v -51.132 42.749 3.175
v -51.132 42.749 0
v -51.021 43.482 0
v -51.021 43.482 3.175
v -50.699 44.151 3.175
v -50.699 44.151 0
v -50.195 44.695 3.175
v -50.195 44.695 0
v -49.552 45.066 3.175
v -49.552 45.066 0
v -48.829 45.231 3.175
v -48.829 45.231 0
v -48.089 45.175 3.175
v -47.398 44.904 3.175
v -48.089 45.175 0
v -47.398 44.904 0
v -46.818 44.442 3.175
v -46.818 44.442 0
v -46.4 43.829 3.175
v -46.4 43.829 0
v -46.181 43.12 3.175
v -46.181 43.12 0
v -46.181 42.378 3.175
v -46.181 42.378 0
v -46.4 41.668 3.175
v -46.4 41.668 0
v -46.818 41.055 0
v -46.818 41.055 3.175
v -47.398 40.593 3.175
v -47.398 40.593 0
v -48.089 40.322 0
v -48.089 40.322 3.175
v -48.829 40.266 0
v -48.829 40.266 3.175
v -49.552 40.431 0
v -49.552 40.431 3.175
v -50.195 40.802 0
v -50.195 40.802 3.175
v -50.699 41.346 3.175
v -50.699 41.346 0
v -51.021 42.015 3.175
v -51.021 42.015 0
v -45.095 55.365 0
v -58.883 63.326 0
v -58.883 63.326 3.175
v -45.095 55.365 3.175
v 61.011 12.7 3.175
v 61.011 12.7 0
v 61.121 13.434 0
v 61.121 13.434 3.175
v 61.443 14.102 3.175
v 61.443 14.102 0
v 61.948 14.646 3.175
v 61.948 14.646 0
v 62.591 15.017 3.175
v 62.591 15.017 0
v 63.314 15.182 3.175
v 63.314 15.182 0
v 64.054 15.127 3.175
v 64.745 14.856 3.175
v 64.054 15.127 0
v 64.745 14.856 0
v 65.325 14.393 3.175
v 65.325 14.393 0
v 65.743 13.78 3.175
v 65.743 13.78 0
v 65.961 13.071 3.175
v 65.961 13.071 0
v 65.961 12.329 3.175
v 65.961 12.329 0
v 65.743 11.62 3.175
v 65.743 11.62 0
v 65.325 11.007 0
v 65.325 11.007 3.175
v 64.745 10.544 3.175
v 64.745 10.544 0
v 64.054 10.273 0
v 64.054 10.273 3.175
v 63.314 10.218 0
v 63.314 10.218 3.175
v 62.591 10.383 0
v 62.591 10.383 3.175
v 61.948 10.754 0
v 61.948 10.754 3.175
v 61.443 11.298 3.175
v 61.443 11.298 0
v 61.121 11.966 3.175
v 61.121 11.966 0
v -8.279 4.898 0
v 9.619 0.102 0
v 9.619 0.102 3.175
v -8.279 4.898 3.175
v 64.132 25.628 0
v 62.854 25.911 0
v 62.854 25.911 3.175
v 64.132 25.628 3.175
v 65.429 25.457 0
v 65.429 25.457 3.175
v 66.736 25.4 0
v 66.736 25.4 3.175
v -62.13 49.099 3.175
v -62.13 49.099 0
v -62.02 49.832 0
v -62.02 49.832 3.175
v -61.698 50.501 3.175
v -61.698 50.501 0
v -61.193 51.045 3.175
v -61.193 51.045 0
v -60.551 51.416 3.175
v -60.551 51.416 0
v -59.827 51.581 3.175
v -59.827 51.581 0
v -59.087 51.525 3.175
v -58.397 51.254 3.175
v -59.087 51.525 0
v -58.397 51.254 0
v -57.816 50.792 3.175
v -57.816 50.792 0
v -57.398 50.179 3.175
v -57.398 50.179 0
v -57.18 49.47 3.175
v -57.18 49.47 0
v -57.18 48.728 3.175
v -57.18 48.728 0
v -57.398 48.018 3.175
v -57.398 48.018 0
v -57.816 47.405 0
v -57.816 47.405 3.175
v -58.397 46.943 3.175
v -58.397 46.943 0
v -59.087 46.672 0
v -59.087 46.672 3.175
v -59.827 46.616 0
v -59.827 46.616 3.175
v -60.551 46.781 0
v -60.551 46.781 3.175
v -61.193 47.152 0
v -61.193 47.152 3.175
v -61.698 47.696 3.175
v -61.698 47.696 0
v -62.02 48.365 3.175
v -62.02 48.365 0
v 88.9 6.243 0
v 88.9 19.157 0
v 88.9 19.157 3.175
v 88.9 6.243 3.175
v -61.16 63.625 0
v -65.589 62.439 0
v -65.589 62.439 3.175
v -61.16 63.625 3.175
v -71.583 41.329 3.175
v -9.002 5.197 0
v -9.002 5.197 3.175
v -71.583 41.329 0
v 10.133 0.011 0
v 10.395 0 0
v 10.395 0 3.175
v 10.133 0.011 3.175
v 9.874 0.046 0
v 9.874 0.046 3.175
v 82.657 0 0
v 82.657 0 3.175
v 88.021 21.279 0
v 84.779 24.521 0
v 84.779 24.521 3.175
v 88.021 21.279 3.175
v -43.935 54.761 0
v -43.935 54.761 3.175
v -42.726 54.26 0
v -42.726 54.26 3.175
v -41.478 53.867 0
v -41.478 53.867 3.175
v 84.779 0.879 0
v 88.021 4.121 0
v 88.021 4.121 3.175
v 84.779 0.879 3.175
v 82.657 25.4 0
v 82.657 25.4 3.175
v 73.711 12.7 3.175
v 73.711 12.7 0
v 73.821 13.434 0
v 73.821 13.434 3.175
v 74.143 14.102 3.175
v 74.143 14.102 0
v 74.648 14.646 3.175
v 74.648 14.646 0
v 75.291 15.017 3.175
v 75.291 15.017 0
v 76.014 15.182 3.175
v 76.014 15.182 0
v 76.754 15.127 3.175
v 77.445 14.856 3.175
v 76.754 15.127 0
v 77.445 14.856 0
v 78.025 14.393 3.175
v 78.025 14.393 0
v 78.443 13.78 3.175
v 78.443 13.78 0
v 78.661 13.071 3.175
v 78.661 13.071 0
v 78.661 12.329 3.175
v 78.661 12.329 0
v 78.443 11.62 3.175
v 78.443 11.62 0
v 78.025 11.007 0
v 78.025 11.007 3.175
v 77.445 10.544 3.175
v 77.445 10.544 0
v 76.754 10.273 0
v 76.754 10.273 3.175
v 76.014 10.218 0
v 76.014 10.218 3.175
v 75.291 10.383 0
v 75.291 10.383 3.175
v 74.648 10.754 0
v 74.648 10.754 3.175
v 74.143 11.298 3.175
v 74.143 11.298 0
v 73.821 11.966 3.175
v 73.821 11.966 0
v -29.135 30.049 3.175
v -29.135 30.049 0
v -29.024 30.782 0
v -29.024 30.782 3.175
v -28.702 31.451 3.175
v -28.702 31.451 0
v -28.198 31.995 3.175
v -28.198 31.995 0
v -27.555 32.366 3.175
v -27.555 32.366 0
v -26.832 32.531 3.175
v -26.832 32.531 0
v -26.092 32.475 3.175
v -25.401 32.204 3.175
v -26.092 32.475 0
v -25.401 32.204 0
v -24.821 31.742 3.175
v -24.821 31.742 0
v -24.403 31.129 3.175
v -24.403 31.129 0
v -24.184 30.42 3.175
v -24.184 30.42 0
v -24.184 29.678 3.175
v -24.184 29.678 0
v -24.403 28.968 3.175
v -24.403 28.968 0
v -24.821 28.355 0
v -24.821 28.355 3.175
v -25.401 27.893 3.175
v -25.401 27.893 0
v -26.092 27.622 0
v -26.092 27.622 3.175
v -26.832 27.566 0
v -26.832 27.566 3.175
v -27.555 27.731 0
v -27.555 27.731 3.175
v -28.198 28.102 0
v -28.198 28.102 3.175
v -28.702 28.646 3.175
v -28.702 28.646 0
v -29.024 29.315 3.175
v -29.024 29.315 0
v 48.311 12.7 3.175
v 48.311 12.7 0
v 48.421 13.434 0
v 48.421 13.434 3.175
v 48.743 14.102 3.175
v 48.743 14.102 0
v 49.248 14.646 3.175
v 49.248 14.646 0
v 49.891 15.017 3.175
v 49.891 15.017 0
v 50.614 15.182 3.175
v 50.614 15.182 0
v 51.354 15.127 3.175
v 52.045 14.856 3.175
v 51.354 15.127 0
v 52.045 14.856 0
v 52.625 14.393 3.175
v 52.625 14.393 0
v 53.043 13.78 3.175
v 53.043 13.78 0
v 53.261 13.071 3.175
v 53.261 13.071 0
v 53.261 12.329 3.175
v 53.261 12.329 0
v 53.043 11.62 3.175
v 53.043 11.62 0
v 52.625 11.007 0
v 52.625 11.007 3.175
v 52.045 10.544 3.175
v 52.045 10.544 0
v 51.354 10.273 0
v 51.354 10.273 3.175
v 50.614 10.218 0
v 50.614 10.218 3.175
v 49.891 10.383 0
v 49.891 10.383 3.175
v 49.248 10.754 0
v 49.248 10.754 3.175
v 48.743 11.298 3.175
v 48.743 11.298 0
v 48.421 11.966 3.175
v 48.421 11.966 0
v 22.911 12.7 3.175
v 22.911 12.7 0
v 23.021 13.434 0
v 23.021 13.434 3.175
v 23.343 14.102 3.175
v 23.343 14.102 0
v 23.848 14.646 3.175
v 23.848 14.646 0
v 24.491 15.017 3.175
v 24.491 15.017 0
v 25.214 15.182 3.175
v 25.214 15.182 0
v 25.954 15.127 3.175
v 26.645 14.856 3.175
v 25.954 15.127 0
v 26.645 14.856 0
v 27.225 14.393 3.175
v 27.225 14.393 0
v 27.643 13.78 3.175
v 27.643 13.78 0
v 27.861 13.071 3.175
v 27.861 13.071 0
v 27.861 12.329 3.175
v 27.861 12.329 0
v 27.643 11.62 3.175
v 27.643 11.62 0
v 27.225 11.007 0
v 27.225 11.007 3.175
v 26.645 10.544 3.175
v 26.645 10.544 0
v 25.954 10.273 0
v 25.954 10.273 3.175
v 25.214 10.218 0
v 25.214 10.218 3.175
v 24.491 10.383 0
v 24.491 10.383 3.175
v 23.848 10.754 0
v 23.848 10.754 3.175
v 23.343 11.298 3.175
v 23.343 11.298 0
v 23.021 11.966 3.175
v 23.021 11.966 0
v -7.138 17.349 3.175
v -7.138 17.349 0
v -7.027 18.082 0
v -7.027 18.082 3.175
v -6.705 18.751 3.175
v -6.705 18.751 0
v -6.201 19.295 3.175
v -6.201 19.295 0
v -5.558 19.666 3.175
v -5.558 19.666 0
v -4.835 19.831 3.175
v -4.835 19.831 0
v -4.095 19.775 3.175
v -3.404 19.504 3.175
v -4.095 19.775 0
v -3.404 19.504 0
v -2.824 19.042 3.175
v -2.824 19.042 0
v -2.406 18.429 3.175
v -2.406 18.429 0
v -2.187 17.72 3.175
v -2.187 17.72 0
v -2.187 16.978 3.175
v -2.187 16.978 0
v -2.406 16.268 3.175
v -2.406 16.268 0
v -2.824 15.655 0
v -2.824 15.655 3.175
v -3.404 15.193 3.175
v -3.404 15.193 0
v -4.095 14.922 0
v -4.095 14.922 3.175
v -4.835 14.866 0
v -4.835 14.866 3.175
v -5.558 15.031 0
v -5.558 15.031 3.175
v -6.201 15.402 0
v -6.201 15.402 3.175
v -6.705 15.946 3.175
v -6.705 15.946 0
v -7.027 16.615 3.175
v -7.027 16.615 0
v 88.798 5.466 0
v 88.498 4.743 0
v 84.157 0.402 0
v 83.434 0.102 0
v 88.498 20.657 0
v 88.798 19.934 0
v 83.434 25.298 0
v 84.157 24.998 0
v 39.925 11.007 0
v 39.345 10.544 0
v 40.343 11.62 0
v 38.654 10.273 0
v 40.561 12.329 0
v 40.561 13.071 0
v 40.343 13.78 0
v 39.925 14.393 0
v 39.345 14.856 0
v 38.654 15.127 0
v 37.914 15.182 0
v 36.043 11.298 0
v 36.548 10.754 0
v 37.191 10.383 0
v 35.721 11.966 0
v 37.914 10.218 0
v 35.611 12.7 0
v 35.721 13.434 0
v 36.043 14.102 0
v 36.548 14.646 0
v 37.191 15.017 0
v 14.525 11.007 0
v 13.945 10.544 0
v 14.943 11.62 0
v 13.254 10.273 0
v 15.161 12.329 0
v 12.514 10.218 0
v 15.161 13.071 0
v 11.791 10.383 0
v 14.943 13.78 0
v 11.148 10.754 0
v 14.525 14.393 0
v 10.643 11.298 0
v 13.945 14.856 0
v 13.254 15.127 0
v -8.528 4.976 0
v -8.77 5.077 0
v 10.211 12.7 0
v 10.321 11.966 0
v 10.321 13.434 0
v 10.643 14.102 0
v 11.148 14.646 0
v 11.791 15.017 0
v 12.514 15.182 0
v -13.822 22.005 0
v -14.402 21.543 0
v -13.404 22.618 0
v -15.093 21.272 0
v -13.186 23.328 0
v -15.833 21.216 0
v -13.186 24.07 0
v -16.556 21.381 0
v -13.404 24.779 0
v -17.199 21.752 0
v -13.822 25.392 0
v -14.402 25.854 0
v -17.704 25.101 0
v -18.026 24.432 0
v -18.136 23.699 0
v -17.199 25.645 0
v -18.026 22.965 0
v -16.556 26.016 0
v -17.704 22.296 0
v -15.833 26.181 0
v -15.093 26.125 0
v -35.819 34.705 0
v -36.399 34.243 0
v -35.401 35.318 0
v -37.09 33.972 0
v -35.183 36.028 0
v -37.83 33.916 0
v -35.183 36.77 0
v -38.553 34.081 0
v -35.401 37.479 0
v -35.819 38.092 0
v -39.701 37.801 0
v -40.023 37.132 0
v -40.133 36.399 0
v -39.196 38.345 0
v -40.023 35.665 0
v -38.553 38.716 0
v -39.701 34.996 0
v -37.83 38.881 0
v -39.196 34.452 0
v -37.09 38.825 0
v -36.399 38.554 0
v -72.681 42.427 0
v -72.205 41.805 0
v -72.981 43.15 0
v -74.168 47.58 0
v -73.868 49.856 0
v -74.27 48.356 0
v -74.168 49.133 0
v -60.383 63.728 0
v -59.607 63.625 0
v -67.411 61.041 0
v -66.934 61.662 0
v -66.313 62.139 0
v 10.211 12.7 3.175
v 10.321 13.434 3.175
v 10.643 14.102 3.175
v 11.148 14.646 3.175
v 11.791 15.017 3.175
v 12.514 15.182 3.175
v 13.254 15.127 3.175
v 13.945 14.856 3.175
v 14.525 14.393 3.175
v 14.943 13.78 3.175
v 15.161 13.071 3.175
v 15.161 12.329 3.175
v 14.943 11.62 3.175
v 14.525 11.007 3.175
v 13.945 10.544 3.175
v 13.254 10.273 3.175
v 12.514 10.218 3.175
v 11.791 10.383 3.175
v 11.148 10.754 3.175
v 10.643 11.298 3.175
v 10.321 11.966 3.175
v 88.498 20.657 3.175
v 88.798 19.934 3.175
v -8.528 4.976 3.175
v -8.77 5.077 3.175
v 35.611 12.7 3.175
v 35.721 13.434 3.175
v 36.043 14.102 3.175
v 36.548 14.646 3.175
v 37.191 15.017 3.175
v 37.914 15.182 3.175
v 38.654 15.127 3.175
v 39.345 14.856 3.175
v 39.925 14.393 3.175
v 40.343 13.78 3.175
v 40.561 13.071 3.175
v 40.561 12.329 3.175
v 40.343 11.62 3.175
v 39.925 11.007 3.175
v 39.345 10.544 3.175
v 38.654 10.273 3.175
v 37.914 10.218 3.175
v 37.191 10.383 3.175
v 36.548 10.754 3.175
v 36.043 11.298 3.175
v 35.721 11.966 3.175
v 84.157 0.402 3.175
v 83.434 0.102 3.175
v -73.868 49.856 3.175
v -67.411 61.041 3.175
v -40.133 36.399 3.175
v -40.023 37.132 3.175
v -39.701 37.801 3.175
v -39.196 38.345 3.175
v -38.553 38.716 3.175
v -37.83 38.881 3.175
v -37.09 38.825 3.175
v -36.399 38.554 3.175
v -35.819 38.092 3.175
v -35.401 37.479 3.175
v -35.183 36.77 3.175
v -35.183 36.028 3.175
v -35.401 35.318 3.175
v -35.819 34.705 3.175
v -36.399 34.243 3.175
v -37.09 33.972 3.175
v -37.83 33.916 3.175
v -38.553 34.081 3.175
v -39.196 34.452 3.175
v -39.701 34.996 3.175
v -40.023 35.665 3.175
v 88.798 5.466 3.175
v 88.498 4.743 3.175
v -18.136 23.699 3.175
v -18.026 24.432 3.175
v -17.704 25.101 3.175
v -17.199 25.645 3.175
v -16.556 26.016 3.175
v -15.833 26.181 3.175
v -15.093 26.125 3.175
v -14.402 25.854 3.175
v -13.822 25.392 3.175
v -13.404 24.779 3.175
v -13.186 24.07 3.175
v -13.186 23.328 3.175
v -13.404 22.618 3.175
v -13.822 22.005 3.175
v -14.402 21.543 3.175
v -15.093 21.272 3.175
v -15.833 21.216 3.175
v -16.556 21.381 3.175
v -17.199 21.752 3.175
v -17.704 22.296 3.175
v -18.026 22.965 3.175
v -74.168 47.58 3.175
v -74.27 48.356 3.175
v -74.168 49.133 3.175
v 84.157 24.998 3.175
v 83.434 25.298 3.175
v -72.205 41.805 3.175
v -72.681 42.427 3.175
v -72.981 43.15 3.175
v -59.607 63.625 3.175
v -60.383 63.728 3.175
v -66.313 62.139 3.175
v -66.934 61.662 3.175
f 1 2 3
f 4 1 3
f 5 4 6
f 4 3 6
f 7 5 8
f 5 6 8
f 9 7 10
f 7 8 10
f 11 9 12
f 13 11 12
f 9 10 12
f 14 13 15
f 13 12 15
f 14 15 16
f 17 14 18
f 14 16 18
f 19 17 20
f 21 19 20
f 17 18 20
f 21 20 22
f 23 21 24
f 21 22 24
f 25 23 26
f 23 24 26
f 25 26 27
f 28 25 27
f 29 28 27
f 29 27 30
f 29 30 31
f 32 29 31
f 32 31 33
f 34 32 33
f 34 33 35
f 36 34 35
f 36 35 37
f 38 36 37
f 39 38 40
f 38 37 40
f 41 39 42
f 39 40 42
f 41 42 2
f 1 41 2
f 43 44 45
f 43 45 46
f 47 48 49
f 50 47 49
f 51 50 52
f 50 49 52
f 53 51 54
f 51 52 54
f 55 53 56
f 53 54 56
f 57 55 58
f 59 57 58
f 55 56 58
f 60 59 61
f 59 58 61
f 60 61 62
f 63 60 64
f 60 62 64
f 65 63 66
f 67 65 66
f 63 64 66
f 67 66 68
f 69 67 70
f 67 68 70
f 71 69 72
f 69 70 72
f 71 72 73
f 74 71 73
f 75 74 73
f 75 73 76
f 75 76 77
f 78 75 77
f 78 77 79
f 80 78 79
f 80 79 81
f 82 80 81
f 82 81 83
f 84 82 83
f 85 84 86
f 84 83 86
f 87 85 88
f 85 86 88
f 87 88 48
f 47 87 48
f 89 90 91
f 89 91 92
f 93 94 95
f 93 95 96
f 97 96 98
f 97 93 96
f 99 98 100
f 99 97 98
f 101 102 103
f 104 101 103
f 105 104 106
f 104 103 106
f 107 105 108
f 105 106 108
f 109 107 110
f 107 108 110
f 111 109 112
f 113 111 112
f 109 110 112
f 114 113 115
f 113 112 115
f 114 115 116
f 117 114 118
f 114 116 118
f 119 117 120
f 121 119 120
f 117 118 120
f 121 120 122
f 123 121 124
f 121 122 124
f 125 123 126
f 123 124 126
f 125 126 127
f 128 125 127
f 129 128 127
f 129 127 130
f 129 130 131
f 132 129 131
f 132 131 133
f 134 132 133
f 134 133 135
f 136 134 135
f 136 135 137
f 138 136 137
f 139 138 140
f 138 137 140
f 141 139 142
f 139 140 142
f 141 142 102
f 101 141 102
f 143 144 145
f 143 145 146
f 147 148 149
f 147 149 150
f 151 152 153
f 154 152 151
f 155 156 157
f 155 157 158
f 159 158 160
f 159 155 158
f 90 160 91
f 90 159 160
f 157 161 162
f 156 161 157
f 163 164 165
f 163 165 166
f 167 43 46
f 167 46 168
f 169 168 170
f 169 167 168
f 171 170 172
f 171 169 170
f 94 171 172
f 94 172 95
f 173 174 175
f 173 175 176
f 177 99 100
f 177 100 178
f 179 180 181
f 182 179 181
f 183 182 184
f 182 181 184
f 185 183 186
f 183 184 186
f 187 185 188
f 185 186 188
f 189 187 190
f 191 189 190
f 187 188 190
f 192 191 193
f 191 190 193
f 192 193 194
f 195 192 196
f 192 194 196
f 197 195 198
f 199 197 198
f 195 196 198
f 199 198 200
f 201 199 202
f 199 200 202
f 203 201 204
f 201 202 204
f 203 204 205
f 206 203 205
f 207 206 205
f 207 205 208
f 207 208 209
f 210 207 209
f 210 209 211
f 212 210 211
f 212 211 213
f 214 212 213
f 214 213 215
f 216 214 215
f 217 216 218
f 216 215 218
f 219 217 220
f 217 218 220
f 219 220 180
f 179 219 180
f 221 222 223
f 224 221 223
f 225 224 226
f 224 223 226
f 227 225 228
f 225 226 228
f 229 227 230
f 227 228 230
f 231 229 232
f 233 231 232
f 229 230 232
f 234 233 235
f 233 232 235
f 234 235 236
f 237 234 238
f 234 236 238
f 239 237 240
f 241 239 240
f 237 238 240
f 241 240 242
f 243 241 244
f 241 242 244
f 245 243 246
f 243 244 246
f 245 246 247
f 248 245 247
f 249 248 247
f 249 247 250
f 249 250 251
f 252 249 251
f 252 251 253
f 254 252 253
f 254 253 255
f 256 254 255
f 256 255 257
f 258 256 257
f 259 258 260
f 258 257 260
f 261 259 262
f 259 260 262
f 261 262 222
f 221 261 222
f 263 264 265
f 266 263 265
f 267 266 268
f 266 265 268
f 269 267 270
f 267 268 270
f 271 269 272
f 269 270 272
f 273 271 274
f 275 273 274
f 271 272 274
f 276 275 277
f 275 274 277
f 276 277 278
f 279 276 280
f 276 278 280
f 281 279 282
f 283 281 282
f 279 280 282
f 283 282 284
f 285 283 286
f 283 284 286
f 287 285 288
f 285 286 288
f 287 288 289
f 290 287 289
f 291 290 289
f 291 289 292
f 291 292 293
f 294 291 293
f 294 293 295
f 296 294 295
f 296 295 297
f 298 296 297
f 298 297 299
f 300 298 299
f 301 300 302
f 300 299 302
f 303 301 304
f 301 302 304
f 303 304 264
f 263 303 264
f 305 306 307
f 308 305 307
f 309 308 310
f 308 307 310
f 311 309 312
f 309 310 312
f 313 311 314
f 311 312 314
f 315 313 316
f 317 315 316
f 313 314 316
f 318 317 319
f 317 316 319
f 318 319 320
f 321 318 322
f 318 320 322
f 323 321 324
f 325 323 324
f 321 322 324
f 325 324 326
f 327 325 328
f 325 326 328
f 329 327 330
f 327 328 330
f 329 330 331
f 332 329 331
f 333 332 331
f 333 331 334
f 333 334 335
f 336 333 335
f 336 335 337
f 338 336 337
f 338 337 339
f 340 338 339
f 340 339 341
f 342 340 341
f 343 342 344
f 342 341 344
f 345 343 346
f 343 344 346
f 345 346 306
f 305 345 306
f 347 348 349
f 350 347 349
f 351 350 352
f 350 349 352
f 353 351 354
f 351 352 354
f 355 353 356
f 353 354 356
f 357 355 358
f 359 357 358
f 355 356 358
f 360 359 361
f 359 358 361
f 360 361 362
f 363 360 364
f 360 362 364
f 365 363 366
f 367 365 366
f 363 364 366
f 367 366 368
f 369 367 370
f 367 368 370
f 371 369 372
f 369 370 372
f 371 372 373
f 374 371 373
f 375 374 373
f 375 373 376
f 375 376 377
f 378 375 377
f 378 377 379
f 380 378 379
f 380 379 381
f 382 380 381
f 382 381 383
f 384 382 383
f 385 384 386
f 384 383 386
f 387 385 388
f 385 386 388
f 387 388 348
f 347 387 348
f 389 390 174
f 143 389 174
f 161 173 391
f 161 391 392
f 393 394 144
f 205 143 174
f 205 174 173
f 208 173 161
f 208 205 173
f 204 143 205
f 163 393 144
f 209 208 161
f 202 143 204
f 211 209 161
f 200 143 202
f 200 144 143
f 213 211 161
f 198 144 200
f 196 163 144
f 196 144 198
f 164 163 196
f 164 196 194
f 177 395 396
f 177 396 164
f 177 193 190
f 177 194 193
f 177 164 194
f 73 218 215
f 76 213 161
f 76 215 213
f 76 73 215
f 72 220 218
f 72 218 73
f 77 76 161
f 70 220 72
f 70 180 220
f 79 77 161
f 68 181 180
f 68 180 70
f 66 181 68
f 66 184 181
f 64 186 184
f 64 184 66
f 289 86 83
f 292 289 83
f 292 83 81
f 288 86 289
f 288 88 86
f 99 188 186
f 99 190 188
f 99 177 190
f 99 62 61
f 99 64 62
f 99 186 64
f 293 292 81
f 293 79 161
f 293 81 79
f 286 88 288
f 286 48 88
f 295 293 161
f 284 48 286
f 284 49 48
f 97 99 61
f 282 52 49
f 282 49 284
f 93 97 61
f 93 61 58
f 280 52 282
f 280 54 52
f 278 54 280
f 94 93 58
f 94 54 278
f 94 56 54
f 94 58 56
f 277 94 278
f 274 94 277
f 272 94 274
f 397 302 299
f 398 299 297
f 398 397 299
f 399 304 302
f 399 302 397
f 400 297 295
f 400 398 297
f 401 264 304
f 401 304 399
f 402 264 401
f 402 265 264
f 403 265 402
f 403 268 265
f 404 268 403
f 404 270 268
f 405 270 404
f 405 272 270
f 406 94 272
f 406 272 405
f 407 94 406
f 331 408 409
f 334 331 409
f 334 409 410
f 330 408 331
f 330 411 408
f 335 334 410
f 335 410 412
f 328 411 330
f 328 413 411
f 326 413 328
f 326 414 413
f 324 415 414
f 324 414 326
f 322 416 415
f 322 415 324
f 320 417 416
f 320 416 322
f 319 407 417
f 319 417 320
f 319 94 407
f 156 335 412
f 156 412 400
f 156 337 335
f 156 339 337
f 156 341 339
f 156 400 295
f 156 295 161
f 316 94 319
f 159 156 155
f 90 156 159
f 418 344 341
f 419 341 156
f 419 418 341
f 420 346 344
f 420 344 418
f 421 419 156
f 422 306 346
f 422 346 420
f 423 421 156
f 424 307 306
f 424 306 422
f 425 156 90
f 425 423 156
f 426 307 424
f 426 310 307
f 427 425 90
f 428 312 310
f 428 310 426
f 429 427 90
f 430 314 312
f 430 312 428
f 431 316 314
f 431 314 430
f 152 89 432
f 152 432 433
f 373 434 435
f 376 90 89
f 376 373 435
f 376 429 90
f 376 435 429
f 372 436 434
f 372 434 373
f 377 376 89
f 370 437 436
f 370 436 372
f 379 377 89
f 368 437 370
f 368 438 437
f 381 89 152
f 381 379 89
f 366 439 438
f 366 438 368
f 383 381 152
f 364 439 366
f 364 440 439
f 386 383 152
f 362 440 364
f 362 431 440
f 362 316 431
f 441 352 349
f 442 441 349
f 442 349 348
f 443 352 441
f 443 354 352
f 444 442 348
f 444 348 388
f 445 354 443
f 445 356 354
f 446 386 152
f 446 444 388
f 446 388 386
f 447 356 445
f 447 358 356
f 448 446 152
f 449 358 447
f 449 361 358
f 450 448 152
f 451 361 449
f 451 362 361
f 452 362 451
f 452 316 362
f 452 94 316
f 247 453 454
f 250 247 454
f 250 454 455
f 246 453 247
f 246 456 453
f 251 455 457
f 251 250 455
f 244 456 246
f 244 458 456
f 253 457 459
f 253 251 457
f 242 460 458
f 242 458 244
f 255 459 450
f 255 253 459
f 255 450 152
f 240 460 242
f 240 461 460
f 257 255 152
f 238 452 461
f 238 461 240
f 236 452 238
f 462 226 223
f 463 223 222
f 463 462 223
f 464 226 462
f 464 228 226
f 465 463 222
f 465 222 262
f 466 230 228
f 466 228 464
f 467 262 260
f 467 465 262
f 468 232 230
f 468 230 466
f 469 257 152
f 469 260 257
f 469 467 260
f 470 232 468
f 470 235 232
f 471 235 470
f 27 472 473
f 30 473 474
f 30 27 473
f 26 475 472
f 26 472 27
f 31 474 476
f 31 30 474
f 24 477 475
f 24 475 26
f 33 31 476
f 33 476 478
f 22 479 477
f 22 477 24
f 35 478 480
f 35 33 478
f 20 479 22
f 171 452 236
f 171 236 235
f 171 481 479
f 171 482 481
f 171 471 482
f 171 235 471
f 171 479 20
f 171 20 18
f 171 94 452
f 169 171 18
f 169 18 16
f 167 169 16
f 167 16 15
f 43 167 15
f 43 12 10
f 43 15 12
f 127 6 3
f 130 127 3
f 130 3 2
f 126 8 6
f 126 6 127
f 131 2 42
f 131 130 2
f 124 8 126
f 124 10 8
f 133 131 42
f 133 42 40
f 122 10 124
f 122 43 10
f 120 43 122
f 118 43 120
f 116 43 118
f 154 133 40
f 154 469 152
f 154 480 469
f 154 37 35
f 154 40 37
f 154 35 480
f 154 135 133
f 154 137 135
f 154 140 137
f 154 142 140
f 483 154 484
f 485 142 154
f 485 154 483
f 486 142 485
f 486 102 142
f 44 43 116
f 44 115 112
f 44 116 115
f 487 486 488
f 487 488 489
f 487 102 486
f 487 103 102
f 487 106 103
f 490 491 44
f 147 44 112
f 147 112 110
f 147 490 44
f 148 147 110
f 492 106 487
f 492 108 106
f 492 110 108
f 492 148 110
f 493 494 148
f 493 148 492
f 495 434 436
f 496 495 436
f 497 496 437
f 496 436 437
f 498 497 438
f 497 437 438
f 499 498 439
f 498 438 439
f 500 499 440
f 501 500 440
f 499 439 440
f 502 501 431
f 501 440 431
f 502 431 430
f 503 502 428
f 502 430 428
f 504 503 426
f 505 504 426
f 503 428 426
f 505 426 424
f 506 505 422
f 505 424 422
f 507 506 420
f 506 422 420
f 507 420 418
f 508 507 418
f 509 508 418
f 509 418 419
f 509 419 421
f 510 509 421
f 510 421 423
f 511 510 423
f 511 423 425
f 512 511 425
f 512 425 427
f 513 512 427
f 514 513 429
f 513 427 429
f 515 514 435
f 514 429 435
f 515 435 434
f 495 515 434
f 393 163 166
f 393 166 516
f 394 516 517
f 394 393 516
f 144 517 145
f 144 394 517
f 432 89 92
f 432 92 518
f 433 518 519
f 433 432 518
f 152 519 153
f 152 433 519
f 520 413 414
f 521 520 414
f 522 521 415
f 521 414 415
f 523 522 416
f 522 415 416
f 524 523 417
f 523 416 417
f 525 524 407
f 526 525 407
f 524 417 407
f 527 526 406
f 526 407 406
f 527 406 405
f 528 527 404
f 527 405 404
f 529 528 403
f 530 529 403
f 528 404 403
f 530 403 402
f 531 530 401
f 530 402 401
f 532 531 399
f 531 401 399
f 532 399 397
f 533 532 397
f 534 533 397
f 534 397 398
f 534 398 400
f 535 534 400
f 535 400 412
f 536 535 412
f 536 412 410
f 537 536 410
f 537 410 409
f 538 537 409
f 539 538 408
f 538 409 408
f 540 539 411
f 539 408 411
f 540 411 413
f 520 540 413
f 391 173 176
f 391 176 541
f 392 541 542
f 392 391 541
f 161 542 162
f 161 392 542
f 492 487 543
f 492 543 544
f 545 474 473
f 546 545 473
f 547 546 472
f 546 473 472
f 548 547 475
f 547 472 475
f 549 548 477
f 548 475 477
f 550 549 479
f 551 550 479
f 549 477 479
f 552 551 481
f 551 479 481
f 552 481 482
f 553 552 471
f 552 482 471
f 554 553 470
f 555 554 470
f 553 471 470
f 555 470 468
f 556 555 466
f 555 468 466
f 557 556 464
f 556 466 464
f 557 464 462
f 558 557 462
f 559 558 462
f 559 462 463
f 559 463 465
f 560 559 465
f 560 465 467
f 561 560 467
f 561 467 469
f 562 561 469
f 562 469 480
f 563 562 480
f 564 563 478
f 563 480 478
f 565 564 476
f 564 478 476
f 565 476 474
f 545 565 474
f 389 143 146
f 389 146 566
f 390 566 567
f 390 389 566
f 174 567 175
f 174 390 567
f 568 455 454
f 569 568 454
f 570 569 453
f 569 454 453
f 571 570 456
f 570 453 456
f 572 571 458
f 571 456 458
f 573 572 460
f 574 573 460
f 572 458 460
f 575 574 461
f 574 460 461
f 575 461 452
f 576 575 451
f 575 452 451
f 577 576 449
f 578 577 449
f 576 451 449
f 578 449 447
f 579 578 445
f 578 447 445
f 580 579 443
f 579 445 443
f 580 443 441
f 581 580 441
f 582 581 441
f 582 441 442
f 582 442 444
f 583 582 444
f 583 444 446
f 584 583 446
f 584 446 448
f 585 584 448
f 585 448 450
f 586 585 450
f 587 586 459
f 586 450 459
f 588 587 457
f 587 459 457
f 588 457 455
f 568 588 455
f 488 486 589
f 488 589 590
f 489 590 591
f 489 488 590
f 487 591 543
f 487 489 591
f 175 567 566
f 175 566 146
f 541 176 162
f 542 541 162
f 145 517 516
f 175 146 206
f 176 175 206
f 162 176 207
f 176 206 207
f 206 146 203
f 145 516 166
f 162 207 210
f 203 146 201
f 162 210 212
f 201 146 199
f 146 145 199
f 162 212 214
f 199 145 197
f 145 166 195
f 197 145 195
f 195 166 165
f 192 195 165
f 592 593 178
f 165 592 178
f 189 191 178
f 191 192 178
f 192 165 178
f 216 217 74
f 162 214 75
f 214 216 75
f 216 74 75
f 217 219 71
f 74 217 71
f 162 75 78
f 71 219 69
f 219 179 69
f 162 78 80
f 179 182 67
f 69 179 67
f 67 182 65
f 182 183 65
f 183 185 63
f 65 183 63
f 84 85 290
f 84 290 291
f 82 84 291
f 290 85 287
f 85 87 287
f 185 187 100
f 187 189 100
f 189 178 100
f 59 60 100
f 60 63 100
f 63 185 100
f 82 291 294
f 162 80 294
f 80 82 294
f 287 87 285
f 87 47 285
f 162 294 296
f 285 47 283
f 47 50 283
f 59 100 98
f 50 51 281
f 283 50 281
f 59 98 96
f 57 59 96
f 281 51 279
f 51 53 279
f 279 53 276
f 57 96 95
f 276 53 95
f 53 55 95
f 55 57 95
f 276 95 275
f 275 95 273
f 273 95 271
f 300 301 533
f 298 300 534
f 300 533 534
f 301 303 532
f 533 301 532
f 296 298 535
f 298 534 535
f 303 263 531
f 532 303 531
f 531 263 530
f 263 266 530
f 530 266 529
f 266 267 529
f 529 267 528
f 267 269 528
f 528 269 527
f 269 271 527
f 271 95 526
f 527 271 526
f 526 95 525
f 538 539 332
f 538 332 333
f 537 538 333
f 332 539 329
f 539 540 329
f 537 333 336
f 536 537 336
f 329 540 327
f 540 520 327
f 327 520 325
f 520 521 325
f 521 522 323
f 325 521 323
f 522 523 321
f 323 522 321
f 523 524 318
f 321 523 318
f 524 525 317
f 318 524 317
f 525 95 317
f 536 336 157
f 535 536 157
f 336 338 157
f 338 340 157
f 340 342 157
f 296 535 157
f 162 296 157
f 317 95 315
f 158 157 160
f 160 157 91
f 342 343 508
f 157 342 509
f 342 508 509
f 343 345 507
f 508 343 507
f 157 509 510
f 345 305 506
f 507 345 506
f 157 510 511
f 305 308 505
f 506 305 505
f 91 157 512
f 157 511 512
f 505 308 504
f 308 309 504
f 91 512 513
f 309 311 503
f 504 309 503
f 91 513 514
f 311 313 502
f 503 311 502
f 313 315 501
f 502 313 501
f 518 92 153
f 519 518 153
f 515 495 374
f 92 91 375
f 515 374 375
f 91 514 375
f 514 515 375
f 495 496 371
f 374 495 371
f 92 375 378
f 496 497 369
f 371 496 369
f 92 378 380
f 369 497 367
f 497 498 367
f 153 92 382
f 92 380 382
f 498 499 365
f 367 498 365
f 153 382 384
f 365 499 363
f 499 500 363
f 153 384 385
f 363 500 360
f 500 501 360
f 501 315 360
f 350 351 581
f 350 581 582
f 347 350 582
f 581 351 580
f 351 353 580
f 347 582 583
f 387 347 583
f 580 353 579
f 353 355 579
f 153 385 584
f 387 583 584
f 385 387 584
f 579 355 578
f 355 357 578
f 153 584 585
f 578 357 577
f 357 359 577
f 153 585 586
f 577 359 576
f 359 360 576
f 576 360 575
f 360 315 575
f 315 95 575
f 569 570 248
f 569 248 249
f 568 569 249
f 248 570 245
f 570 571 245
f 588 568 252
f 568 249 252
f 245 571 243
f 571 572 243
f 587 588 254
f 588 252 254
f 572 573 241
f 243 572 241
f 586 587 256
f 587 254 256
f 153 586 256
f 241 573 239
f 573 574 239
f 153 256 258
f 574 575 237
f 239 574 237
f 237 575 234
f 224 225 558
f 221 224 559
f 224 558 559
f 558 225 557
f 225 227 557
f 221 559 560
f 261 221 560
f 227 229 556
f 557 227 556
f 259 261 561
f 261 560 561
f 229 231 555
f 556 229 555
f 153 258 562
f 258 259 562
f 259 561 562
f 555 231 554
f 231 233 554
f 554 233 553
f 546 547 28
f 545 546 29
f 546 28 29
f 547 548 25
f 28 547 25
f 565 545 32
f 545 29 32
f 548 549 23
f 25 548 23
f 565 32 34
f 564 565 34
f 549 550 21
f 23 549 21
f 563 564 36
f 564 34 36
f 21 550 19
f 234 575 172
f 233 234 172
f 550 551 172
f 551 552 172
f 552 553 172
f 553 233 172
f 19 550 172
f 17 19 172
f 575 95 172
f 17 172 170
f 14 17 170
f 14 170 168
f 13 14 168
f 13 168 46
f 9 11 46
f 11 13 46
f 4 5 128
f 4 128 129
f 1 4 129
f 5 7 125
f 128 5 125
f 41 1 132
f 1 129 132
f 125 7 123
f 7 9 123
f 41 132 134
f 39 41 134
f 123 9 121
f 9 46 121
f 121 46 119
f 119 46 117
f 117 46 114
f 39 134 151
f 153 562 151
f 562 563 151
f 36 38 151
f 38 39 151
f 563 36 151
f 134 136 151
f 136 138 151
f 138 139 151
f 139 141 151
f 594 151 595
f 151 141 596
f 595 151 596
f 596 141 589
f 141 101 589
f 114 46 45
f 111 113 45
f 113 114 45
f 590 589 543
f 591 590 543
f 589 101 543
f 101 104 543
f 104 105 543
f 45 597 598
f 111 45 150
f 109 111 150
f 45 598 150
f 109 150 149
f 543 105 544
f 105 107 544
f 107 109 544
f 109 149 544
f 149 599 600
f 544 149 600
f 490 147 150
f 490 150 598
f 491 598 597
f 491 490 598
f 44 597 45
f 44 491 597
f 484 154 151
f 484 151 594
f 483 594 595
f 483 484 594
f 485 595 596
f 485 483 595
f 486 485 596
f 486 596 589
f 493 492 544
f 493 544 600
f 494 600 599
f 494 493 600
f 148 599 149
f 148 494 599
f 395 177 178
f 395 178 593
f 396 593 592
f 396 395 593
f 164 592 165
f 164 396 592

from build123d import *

# Parameters (mm, degrees)
SKETCH1_R           = 2.4892
BOSS_EXTRUDE1_DEPTH = 3.175


with BuildPart() as part:
    # Sketch1 → Boss-Extrude1 (new body)
    with BuildSketch(Plane(origin=(0, 0, 0), x_dir=(-1, 0, 0), z_dir=(0, 0, -1))):
        with BuildLine():
            Line((-82.657359313, 0), (-10.394957493, 0))
            ThreePointArc((-10.394957493, 0), (-10.003378916, 0.025665416), (-9.618500357, 0.102222521))
            Line((-9.618500357, 0.102222521), (8.278754395, 4.897777479))
            ThreePointArc((8.278754395, 4.897777479), (8.650347557, 5.02391636), (9.00229726, 5.197478746))
            Line((9.00229726, 5.197478746), (71.583372975, 41.328679656))
            ThreePointArc((71.583372975, 41.328679656), (72.463432996, 42.100471581), (72.981150454, 43.150298732))
            Line((72.981150454, 43.150298732), (74.16803932, 47.579828286))
            ThreePointArc((74.16803932, 47.579828286), (74.244596426, 48.747863998), (73.868338053, 49.856285422))
            Line((73.868338053, 49.856285422), (67.41097874, 61.040759834))
            ThreePointArc((67.41097874, 61.040759834), (66.639186816, 61.920819855), (65.589359664, 62.438537313))
            Line((65.589359664, 62.438537313), (61.15983011, 63.62542618))
            ThreePointArc((61.15983011, 63.62542618), (59.991794398, 63.701983285), (58.883372975, 63.325724913))
            Line((58.883372975, 63.325724913), (45.095284847, 55.365168521))
            ThreePointArc((45.095284847, 55.365168521), (43.335536333, 54.49735659), (41.477570524, 53.866662183))
            Line((41.477570524, 53.866662183), (-62.853960852, 25.911112606))
            ThreePointArc((-62.853960852, 25.911112606), (-64.778353646, 25.528327079), (-66.736246529, 25.4))
            Line((-66.736246529, 25.4), (-82.657359313, 25.4))
            ThreePointArc((-82.657359313, 25.4), (-83.80540961, 25.171638598), (-84.778679656, 24.521320344))
            Line((-84.778679656, 24.521320344), (-88.021320344, 21.278679656))
            ThreePointArc((-88.021320344, 21.278679656), (-88.671638598, 20.30540961), (-88.9, 19.157359313))
            Line((-88.9, 19.157359313), (-88.9, 6.242640687))
            ThreePointArc((-88.9, 6.242640687), (-88.671638598, 5.09459039), (-88.021320344, 4.121320344))
            Line((-88.021320344, 4.121320344), (-84.778679656, 0.878679656))
            ThreePointArc((-84.778679656, 0.878679656), (-83.80540961, 0.228361402), (-82.657359313, 0))
        make_face()
        with Locations((-12.7, 12.7)):
            Circle(SKETCH1_R, mode=Mode.SUBTRACT)
        with Locations((4.648522628, 17.348522628)):
            Circle(SKETCH1_R, mode=Mode.SUBTRACT)
        with Locations((-63.5, 12.7)):
            Circle(SKETCH1_R, mode=Mode.SUBTRACT)
        with Locations((-38.1, 12.7)):
            Circle(SKETCH1_R, mode=Mode.SUBTRACT)
        with Locations((26.645567884, 30.048522628)):
            Circle(SKETCH1_R, mode=Mode.SUBTRACT)
        with Locations((48.64261314, 42.748522628)):
            Circle(SKETCH1_R, mode=Mode.SUBTRACT)
        with Locations((-76.2, 12.7)):
            Circle(SKETCH1_R, mode=Mode.SUBTRACT)
        with Locations((-50.8, 12.7)):
            Circle(SKETCH1_R, mode=Mode.SUBTRACT)
        with Locations((-25.4, 12.7)):
            Circle(SKETCH1_R, mode=Mode.SUBTRACT)
        with Locations((15.647045256, 23.698522628)):
            Circle(SKETCH1_R, mode=Mode.SUBTRACT)
        with Locations((37.644090512, 36.398522628)):
            Circle(SKETCH1_R, mode=Mode.SUBTRACT)
        with Locations((59.641135768, 49.098522628)):
            Circle(SKETCH1_R, mode=Mode.SUBTRACT)
    extrude(amount=-BOSS_EXTRUDE1_DEPTH)


solid = part.part
